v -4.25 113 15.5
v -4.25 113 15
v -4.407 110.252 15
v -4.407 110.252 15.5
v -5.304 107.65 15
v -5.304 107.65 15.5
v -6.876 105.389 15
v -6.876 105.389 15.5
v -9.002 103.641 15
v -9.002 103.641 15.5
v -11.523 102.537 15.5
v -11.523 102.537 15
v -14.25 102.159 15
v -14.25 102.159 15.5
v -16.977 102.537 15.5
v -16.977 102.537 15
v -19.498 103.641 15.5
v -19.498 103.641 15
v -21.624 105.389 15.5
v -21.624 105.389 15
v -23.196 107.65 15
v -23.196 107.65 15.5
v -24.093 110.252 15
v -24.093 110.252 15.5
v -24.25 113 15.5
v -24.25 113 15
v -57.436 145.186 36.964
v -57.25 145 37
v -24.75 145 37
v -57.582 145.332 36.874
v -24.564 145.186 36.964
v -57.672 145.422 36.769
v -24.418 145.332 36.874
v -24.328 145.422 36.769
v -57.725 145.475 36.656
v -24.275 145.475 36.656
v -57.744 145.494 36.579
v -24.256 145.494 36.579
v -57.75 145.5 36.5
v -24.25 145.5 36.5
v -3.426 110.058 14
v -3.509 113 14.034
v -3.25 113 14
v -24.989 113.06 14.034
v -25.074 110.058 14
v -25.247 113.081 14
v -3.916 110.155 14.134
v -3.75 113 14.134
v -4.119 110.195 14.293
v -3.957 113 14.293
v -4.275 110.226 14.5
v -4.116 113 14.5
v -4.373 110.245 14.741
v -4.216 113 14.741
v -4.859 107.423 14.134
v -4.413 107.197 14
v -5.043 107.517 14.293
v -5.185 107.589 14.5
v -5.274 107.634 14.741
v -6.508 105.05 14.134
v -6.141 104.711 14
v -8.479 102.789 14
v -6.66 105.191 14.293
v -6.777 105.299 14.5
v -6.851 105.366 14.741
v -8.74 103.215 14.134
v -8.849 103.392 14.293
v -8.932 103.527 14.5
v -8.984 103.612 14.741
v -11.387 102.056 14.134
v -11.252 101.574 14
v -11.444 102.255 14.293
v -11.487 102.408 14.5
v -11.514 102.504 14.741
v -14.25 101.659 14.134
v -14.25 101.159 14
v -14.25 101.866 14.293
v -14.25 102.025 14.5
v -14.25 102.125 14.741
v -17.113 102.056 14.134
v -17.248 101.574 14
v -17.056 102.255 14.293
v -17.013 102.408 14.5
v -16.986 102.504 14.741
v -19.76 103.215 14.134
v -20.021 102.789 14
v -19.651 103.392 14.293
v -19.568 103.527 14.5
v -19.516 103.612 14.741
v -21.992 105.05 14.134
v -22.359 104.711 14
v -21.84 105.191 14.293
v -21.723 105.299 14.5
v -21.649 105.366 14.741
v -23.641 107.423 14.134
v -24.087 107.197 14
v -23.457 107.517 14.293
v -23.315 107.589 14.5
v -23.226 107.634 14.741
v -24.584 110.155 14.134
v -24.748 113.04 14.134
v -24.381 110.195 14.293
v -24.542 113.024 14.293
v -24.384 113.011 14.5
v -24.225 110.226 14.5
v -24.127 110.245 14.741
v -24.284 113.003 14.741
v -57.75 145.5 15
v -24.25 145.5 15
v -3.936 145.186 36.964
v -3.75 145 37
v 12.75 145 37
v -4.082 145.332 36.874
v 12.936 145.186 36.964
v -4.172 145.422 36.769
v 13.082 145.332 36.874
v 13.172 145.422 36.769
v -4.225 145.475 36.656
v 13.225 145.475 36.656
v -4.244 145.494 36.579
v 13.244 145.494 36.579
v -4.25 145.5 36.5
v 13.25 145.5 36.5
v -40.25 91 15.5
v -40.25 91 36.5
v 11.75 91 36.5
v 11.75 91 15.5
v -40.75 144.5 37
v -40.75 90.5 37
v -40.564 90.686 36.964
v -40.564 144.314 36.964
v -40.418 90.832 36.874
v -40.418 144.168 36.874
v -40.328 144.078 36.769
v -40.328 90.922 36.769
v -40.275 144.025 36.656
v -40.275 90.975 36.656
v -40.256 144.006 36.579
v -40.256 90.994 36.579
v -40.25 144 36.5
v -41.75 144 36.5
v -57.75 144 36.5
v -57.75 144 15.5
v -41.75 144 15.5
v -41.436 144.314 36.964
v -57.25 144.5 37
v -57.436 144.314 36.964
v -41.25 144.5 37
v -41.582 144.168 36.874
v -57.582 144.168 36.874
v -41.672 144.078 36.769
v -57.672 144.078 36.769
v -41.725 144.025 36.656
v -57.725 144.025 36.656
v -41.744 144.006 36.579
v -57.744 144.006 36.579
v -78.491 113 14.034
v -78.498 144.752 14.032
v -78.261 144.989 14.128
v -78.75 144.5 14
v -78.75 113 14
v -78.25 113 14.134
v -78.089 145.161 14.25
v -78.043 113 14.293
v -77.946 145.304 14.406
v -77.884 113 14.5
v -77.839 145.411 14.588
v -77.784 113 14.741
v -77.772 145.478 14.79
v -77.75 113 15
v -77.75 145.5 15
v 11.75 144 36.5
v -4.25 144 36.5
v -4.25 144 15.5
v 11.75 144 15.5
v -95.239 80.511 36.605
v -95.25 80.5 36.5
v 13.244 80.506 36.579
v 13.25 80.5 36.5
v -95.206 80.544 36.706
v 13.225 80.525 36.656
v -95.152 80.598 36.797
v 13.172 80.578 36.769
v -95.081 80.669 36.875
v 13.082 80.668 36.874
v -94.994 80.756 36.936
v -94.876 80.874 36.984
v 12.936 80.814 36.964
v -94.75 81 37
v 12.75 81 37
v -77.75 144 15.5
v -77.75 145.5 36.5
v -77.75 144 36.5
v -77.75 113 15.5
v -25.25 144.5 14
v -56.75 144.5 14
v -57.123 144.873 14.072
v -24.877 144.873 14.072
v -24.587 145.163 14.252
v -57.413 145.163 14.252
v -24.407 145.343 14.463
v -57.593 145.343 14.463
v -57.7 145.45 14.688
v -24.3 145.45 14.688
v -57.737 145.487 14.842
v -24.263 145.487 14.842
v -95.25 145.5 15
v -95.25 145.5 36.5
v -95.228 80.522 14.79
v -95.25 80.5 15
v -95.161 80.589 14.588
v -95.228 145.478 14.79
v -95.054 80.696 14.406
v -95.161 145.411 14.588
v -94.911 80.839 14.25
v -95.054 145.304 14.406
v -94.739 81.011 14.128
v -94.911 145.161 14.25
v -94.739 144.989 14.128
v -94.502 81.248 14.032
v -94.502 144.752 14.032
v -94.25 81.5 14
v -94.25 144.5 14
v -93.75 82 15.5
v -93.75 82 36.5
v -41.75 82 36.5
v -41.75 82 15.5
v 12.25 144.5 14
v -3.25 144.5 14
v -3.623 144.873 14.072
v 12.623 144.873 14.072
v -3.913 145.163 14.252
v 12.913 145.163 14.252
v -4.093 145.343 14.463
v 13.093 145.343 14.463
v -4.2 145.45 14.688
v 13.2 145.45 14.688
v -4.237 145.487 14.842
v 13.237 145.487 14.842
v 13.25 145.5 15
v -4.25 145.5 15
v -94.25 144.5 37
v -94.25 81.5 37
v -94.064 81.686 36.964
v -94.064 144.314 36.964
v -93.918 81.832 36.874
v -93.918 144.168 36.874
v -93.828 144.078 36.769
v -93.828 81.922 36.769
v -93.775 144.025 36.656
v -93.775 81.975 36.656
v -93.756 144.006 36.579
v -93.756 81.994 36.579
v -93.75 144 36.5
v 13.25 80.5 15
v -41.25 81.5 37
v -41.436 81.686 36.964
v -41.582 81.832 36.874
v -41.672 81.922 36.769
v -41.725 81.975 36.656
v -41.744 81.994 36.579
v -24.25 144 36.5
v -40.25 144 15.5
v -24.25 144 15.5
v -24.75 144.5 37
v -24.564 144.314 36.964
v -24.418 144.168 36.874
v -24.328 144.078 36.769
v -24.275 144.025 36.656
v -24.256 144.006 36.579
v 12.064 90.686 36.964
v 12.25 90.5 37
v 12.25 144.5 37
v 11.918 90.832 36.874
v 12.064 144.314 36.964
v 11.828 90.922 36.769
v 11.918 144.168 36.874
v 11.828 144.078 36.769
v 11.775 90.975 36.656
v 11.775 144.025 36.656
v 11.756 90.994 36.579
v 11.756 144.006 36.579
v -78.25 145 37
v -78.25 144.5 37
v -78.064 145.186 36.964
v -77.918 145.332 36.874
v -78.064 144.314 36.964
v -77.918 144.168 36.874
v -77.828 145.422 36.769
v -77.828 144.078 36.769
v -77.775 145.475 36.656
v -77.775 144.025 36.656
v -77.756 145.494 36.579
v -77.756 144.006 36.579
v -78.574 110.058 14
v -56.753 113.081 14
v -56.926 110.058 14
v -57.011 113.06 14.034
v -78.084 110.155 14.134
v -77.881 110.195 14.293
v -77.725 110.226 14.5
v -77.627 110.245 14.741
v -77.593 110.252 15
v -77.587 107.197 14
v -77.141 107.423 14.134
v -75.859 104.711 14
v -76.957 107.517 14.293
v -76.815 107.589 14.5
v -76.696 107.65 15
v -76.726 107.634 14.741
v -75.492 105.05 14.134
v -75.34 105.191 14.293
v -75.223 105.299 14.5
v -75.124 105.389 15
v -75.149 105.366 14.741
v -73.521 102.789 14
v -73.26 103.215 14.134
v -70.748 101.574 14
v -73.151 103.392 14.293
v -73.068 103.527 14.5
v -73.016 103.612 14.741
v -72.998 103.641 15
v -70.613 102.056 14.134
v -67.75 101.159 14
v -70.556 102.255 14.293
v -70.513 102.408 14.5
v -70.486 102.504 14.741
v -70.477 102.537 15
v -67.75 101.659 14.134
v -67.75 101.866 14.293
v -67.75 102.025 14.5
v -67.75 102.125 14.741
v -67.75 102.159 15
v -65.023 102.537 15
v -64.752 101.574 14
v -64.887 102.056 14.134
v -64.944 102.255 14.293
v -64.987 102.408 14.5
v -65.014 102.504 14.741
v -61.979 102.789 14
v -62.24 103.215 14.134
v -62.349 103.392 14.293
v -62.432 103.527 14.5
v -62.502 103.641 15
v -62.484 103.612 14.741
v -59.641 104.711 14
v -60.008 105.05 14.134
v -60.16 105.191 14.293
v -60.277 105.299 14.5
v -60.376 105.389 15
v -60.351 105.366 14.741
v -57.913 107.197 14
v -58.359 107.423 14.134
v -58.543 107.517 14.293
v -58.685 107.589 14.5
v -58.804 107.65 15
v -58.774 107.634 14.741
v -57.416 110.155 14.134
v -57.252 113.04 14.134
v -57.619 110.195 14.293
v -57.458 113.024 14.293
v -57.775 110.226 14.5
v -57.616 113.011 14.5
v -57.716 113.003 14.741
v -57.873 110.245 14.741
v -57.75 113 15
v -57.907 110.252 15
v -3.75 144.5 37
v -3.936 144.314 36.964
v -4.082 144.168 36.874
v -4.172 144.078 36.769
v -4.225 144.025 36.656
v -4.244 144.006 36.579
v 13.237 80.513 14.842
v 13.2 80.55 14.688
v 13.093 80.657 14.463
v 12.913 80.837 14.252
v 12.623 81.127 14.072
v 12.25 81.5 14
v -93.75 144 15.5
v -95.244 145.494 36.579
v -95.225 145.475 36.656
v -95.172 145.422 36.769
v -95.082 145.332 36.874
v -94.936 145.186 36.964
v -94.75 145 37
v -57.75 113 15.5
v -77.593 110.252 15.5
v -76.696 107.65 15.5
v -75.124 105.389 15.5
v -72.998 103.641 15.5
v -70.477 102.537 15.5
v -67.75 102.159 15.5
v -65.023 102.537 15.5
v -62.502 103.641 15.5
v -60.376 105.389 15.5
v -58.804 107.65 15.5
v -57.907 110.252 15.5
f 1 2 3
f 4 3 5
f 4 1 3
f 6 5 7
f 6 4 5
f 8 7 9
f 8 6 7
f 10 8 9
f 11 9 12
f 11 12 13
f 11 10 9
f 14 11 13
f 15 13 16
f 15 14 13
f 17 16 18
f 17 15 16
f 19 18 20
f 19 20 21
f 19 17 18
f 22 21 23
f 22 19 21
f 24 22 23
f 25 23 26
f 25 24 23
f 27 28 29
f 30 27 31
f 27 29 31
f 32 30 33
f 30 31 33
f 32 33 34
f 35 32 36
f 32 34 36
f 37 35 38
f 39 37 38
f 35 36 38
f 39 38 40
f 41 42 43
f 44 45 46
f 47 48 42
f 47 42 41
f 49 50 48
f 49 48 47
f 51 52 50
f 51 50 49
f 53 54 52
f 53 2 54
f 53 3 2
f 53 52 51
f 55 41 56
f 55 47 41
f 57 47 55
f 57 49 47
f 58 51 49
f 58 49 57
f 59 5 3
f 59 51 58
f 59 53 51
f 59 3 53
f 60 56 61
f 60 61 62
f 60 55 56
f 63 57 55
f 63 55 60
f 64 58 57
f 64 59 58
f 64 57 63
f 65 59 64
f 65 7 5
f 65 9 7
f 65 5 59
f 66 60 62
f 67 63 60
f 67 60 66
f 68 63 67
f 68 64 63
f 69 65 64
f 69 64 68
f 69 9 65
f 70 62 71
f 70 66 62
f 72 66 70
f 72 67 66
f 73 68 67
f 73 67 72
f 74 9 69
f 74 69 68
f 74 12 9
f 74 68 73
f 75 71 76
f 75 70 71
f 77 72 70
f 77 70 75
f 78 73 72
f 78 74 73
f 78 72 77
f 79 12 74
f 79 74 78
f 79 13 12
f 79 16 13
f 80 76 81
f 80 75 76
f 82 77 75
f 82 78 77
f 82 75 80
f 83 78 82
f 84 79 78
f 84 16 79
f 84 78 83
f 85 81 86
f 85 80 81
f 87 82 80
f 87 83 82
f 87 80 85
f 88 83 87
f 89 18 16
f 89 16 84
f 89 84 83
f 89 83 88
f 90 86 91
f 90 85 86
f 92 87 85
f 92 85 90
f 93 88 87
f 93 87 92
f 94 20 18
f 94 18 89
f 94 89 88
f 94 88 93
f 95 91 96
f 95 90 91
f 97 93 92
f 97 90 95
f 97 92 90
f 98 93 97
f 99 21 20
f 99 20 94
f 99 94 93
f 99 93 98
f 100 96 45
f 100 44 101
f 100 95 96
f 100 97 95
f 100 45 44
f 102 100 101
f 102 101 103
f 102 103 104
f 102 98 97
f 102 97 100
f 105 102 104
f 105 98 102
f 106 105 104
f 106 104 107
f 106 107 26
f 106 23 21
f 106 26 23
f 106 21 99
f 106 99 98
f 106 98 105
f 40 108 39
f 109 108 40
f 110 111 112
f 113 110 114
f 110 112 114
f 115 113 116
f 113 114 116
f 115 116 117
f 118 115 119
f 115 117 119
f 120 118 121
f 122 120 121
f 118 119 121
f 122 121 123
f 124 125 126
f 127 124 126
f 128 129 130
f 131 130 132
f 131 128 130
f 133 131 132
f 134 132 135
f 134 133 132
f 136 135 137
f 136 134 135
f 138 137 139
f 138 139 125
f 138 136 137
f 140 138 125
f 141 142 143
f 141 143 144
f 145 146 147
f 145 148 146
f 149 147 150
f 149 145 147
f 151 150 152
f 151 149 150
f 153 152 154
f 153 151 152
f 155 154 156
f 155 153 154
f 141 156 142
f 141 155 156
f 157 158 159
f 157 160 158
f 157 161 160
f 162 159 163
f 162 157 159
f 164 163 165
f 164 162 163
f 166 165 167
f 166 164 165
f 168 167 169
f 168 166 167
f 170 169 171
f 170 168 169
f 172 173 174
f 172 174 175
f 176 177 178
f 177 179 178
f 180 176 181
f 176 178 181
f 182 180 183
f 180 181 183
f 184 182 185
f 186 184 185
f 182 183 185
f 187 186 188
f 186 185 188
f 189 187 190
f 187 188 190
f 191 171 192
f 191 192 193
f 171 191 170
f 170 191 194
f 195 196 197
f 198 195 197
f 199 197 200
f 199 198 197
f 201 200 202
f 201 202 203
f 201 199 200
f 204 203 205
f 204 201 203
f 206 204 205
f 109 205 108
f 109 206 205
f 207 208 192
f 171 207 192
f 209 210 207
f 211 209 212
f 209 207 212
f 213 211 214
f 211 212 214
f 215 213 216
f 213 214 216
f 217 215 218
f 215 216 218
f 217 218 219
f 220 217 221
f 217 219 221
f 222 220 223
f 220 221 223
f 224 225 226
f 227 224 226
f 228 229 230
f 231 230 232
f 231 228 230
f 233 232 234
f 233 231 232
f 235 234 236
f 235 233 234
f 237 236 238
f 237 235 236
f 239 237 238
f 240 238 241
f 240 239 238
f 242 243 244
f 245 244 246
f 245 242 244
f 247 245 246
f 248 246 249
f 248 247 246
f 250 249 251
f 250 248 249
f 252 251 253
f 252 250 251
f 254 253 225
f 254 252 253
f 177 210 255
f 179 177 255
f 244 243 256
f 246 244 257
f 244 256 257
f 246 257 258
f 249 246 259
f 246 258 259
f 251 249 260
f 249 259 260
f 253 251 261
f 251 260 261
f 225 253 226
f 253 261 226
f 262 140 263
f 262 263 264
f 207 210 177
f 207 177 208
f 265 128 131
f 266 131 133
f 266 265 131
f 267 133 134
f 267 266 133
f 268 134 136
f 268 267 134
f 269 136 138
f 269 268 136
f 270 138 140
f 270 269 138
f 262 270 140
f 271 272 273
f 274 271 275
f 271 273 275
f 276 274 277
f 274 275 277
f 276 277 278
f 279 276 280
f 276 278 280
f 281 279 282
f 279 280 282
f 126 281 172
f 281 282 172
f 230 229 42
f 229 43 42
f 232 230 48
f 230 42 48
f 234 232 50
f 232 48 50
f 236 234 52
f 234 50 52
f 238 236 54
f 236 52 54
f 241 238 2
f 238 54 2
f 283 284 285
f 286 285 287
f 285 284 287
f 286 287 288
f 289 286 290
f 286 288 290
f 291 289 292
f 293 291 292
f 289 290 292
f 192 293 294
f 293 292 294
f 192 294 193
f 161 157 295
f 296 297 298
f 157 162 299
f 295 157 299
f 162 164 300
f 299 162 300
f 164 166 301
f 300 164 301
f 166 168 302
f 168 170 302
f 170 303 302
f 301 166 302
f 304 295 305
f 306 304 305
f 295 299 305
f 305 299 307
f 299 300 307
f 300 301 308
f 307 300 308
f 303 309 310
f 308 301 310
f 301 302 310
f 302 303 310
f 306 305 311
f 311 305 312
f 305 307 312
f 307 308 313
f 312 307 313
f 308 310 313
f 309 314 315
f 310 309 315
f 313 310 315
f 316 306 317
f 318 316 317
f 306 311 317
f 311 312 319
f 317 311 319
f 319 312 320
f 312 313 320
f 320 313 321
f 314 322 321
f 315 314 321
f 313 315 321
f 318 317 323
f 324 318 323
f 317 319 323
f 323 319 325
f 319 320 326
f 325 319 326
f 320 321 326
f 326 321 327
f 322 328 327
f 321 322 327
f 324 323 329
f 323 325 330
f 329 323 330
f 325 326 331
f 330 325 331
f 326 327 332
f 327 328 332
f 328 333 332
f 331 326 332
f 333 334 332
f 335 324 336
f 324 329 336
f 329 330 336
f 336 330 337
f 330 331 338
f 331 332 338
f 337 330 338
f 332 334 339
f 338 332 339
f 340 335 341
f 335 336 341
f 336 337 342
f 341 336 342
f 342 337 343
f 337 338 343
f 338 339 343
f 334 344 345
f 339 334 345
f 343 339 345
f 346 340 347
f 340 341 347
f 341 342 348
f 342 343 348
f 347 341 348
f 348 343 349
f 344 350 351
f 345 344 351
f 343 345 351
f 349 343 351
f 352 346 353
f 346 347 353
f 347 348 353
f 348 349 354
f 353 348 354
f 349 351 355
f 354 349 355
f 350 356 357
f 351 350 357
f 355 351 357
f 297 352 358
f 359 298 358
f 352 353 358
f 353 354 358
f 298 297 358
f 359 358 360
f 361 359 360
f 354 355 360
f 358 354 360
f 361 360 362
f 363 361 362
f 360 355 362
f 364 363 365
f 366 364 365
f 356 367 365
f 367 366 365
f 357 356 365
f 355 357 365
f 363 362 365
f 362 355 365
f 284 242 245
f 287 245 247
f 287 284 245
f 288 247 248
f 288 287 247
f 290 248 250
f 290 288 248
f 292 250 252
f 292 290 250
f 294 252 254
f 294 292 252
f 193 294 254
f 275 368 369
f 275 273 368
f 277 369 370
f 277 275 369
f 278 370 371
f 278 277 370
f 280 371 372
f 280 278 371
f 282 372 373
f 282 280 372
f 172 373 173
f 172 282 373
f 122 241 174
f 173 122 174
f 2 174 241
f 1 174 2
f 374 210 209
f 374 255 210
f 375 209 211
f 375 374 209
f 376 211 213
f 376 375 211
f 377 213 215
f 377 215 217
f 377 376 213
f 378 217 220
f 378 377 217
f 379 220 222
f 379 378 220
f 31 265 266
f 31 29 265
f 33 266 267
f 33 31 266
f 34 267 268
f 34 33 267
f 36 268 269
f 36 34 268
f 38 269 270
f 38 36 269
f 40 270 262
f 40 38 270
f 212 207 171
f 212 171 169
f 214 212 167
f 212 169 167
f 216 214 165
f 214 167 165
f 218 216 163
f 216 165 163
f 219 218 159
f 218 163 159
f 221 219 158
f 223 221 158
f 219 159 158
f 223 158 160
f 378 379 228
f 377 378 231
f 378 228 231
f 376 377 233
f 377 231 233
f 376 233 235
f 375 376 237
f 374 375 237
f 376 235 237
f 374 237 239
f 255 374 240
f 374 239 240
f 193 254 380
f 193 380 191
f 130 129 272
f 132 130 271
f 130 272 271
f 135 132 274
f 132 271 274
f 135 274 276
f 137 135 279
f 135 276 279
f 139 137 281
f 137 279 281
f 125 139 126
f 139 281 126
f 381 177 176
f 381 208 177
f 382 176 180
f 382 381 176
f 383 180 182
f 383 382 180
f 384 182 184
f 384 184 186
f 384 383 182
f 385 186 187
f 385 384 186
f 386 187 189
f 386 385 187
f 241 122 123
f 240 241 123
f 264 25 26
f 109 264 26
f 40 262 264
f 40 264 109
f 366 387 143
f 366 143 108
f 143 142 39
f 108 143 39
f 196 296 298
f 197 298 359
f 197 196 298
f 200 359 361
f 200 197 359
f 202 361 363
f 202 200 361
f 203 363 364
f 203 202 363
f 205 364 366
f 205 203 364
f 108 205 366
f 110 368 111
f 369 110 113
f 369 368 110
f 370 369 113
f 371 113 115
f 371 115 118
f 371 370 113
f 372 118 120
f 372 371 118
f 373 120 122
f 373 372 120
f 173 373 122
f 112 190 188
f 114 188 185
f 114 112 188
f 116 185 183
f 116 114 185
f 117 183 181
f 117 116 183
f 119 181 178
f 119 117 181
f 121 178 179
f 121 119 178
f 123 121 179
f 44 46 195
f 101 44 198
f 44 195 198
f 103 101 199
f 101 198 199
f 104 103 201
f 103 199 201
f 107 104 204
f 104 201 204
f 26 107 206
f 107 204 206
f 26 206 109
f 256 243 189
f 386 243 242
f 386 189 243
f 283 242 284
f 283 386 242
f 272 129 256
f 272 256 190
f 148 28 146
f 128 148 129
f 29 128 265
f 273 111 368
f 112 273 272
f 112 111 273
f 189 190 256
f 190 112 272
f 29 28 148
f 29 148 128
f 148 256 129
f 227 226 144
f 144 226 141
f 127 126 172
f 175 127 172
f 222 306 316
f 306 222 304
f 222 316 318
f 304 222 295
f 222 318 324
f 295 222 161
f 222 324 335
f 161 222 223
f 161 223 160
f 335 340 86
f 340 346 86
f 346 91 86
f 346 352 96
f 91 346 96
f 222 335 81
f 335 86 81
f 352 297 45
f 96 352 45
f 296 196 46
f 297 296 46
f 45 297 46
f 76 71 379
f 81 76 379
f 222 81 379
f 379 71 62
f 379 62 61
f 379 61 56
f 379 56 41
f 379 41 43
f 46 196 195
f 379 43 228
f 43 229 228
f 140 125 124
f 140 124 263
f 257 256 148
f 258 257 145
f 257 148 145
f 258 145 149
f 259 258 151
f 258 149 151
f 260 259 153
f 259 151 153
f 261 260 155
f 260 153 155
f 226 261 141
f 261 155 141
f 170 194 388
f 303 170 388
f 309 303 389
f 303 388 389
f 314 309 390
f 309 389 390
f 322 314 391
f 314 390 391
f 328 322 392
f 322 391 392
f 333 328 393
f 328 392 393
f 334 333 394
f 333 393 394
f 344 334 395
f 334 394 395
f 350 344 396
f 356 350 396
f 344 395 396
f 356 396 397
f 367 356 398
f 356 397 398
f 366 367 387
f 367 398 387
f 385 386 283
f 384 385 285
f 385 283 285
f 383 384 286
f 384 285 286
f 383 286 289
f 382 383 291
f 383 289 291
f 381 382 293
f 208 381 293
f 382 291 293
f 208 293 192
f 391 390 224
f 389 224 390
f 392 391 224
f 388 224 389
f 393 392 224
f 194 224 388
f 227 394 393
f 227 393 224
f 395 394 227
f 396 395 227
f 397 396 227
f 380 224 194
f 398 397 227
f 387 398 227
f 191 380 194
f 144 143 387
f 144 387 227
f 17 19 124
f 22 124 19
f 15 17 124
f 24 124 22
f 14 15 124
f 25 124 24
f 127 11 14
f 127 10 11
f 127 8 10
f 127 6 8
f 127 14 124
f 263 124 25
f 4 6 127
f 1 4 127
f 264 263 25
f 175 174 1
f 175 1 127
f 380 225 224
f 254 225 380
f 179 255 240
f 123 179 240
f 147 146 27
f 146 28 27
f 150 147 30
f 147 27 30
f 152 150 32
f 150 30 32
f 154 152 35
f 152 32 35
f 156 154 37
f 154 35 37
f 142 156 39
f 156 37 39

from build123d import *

# Parameters (mm, degrees)
SKETCH006_W     = 108.5
SKETCH006_H     = 65
PAD003_DEPTH    = 23
SKETCH007_W     = 52
SKETCH007_H     = 62
SKETCH007_H_2   = 53
POCKET003_DEPTH = 21.5
POCKET004_DEPTH = 280.109926
FILLET003_R     = 1
FILLET004_R     = 0.5


with BuildPart() as part:
    # Sketch006 → Pad003 (new body)
    with BuildSketch(Plane.XY):
        Rectangle(SKETCH006_W, SKETCH006_H)
    extrude(amount=PAD003_DEPTH)

    # Sketch007 (on DatumPlane) → Pocket003 (cut)
    with BuildSketch(Plane.XY.offset(23)):
        with Locations((-26.75, 0)):
            Rectangle(SKETCH007_W, SKETCH007_H)
        with Locations((26.75, 4.5)):
            Rectangle(SKETCH007_W, SKETCH007_H_2)
    extrude(amount=-POCKET003_DEPTH, mode=Mode.SUBTRACT)

    # Sketch008 (on DatumPlane) → Pocket004 (cut, through all)
    with BuildSketch(Plane(origin=(-26.75, 0, 23), x_dir=(1, 0, 0), z_dir=(0, 0, 1))):
        with BuildLine():
            Line((10, 0), (10, 40))
            Line((10, 40), (-10, 40))
            Line((-10, 40), (-10, 0))
            ThreePointArc((-10, 0), (0, -10.840906), (10, 0))
        make_face()
    pocket004 = extrude(amount=-POCKET004_DEPTH, mode=Mode.SUBTRACT)

    # Mirrored002: Pocket004 across YZ
    add(pocket004.mirror(Plane.YZ), mode=Mode.SUBTRACT)

    # Fillet003
    fillet003_edges = [part.edges().sort_by_distance(p)[0] for p in [
        (-45.5, 32.5, 0),
        (-36.75, 16.25, 0),
        (-26.75, -10.840906, 0),
        (-16.75, 16.25, 0),
        (0, 32.5, 0),
        (16.75, 16.25, 0),
        (26.75, -10.840906, 0),
        (36.75, 16.25, 0),
        (45.5, 32.5, 0),
        (54.25, 0, 0),
        (0, -32.5, 0),
        (-54.25, 0, 0),
    ]]
    fillet(fillet003_edges, radius=FILLET003_R)

    # Fillet004
    fillet004_edges = [part.edges().sort_by_distance(p)[0] for p in [
        (-45.5, 32.5, 23),
        (-36.75, 31.75, 23),
        (-44.75, 31, 23),
        (-52.75, 0, 23),
        (-26.75, -31, 23),
        (-0.75, 0, 23),
        (-8.75, 31, 23),
        (-16.75, 31.75, 23),
        (0, 32.5, 23),
        (16.75, 31.75, 23),
        (8.75, 31, 23),
        (0.75, 4.5, 23),
        (26.75, -22, 23),
        (52.75, 4.5, 23),
        (44.75, 31, 23),
        (36.75, 31.75, 23),
        (45.5, 32.5, 23),
        (54.25, 0, 23),
        (0, -32.5, 23),
        (-54.25, 0, 23),
    ]]
    fillet(fillet004_edges, radius=FILLET004_R)


with BuildPart() as part_1:
    # Body002 placement: moved
    add(part.part.moved(Location((-41, 113, 14))))


solid = part_1.part
